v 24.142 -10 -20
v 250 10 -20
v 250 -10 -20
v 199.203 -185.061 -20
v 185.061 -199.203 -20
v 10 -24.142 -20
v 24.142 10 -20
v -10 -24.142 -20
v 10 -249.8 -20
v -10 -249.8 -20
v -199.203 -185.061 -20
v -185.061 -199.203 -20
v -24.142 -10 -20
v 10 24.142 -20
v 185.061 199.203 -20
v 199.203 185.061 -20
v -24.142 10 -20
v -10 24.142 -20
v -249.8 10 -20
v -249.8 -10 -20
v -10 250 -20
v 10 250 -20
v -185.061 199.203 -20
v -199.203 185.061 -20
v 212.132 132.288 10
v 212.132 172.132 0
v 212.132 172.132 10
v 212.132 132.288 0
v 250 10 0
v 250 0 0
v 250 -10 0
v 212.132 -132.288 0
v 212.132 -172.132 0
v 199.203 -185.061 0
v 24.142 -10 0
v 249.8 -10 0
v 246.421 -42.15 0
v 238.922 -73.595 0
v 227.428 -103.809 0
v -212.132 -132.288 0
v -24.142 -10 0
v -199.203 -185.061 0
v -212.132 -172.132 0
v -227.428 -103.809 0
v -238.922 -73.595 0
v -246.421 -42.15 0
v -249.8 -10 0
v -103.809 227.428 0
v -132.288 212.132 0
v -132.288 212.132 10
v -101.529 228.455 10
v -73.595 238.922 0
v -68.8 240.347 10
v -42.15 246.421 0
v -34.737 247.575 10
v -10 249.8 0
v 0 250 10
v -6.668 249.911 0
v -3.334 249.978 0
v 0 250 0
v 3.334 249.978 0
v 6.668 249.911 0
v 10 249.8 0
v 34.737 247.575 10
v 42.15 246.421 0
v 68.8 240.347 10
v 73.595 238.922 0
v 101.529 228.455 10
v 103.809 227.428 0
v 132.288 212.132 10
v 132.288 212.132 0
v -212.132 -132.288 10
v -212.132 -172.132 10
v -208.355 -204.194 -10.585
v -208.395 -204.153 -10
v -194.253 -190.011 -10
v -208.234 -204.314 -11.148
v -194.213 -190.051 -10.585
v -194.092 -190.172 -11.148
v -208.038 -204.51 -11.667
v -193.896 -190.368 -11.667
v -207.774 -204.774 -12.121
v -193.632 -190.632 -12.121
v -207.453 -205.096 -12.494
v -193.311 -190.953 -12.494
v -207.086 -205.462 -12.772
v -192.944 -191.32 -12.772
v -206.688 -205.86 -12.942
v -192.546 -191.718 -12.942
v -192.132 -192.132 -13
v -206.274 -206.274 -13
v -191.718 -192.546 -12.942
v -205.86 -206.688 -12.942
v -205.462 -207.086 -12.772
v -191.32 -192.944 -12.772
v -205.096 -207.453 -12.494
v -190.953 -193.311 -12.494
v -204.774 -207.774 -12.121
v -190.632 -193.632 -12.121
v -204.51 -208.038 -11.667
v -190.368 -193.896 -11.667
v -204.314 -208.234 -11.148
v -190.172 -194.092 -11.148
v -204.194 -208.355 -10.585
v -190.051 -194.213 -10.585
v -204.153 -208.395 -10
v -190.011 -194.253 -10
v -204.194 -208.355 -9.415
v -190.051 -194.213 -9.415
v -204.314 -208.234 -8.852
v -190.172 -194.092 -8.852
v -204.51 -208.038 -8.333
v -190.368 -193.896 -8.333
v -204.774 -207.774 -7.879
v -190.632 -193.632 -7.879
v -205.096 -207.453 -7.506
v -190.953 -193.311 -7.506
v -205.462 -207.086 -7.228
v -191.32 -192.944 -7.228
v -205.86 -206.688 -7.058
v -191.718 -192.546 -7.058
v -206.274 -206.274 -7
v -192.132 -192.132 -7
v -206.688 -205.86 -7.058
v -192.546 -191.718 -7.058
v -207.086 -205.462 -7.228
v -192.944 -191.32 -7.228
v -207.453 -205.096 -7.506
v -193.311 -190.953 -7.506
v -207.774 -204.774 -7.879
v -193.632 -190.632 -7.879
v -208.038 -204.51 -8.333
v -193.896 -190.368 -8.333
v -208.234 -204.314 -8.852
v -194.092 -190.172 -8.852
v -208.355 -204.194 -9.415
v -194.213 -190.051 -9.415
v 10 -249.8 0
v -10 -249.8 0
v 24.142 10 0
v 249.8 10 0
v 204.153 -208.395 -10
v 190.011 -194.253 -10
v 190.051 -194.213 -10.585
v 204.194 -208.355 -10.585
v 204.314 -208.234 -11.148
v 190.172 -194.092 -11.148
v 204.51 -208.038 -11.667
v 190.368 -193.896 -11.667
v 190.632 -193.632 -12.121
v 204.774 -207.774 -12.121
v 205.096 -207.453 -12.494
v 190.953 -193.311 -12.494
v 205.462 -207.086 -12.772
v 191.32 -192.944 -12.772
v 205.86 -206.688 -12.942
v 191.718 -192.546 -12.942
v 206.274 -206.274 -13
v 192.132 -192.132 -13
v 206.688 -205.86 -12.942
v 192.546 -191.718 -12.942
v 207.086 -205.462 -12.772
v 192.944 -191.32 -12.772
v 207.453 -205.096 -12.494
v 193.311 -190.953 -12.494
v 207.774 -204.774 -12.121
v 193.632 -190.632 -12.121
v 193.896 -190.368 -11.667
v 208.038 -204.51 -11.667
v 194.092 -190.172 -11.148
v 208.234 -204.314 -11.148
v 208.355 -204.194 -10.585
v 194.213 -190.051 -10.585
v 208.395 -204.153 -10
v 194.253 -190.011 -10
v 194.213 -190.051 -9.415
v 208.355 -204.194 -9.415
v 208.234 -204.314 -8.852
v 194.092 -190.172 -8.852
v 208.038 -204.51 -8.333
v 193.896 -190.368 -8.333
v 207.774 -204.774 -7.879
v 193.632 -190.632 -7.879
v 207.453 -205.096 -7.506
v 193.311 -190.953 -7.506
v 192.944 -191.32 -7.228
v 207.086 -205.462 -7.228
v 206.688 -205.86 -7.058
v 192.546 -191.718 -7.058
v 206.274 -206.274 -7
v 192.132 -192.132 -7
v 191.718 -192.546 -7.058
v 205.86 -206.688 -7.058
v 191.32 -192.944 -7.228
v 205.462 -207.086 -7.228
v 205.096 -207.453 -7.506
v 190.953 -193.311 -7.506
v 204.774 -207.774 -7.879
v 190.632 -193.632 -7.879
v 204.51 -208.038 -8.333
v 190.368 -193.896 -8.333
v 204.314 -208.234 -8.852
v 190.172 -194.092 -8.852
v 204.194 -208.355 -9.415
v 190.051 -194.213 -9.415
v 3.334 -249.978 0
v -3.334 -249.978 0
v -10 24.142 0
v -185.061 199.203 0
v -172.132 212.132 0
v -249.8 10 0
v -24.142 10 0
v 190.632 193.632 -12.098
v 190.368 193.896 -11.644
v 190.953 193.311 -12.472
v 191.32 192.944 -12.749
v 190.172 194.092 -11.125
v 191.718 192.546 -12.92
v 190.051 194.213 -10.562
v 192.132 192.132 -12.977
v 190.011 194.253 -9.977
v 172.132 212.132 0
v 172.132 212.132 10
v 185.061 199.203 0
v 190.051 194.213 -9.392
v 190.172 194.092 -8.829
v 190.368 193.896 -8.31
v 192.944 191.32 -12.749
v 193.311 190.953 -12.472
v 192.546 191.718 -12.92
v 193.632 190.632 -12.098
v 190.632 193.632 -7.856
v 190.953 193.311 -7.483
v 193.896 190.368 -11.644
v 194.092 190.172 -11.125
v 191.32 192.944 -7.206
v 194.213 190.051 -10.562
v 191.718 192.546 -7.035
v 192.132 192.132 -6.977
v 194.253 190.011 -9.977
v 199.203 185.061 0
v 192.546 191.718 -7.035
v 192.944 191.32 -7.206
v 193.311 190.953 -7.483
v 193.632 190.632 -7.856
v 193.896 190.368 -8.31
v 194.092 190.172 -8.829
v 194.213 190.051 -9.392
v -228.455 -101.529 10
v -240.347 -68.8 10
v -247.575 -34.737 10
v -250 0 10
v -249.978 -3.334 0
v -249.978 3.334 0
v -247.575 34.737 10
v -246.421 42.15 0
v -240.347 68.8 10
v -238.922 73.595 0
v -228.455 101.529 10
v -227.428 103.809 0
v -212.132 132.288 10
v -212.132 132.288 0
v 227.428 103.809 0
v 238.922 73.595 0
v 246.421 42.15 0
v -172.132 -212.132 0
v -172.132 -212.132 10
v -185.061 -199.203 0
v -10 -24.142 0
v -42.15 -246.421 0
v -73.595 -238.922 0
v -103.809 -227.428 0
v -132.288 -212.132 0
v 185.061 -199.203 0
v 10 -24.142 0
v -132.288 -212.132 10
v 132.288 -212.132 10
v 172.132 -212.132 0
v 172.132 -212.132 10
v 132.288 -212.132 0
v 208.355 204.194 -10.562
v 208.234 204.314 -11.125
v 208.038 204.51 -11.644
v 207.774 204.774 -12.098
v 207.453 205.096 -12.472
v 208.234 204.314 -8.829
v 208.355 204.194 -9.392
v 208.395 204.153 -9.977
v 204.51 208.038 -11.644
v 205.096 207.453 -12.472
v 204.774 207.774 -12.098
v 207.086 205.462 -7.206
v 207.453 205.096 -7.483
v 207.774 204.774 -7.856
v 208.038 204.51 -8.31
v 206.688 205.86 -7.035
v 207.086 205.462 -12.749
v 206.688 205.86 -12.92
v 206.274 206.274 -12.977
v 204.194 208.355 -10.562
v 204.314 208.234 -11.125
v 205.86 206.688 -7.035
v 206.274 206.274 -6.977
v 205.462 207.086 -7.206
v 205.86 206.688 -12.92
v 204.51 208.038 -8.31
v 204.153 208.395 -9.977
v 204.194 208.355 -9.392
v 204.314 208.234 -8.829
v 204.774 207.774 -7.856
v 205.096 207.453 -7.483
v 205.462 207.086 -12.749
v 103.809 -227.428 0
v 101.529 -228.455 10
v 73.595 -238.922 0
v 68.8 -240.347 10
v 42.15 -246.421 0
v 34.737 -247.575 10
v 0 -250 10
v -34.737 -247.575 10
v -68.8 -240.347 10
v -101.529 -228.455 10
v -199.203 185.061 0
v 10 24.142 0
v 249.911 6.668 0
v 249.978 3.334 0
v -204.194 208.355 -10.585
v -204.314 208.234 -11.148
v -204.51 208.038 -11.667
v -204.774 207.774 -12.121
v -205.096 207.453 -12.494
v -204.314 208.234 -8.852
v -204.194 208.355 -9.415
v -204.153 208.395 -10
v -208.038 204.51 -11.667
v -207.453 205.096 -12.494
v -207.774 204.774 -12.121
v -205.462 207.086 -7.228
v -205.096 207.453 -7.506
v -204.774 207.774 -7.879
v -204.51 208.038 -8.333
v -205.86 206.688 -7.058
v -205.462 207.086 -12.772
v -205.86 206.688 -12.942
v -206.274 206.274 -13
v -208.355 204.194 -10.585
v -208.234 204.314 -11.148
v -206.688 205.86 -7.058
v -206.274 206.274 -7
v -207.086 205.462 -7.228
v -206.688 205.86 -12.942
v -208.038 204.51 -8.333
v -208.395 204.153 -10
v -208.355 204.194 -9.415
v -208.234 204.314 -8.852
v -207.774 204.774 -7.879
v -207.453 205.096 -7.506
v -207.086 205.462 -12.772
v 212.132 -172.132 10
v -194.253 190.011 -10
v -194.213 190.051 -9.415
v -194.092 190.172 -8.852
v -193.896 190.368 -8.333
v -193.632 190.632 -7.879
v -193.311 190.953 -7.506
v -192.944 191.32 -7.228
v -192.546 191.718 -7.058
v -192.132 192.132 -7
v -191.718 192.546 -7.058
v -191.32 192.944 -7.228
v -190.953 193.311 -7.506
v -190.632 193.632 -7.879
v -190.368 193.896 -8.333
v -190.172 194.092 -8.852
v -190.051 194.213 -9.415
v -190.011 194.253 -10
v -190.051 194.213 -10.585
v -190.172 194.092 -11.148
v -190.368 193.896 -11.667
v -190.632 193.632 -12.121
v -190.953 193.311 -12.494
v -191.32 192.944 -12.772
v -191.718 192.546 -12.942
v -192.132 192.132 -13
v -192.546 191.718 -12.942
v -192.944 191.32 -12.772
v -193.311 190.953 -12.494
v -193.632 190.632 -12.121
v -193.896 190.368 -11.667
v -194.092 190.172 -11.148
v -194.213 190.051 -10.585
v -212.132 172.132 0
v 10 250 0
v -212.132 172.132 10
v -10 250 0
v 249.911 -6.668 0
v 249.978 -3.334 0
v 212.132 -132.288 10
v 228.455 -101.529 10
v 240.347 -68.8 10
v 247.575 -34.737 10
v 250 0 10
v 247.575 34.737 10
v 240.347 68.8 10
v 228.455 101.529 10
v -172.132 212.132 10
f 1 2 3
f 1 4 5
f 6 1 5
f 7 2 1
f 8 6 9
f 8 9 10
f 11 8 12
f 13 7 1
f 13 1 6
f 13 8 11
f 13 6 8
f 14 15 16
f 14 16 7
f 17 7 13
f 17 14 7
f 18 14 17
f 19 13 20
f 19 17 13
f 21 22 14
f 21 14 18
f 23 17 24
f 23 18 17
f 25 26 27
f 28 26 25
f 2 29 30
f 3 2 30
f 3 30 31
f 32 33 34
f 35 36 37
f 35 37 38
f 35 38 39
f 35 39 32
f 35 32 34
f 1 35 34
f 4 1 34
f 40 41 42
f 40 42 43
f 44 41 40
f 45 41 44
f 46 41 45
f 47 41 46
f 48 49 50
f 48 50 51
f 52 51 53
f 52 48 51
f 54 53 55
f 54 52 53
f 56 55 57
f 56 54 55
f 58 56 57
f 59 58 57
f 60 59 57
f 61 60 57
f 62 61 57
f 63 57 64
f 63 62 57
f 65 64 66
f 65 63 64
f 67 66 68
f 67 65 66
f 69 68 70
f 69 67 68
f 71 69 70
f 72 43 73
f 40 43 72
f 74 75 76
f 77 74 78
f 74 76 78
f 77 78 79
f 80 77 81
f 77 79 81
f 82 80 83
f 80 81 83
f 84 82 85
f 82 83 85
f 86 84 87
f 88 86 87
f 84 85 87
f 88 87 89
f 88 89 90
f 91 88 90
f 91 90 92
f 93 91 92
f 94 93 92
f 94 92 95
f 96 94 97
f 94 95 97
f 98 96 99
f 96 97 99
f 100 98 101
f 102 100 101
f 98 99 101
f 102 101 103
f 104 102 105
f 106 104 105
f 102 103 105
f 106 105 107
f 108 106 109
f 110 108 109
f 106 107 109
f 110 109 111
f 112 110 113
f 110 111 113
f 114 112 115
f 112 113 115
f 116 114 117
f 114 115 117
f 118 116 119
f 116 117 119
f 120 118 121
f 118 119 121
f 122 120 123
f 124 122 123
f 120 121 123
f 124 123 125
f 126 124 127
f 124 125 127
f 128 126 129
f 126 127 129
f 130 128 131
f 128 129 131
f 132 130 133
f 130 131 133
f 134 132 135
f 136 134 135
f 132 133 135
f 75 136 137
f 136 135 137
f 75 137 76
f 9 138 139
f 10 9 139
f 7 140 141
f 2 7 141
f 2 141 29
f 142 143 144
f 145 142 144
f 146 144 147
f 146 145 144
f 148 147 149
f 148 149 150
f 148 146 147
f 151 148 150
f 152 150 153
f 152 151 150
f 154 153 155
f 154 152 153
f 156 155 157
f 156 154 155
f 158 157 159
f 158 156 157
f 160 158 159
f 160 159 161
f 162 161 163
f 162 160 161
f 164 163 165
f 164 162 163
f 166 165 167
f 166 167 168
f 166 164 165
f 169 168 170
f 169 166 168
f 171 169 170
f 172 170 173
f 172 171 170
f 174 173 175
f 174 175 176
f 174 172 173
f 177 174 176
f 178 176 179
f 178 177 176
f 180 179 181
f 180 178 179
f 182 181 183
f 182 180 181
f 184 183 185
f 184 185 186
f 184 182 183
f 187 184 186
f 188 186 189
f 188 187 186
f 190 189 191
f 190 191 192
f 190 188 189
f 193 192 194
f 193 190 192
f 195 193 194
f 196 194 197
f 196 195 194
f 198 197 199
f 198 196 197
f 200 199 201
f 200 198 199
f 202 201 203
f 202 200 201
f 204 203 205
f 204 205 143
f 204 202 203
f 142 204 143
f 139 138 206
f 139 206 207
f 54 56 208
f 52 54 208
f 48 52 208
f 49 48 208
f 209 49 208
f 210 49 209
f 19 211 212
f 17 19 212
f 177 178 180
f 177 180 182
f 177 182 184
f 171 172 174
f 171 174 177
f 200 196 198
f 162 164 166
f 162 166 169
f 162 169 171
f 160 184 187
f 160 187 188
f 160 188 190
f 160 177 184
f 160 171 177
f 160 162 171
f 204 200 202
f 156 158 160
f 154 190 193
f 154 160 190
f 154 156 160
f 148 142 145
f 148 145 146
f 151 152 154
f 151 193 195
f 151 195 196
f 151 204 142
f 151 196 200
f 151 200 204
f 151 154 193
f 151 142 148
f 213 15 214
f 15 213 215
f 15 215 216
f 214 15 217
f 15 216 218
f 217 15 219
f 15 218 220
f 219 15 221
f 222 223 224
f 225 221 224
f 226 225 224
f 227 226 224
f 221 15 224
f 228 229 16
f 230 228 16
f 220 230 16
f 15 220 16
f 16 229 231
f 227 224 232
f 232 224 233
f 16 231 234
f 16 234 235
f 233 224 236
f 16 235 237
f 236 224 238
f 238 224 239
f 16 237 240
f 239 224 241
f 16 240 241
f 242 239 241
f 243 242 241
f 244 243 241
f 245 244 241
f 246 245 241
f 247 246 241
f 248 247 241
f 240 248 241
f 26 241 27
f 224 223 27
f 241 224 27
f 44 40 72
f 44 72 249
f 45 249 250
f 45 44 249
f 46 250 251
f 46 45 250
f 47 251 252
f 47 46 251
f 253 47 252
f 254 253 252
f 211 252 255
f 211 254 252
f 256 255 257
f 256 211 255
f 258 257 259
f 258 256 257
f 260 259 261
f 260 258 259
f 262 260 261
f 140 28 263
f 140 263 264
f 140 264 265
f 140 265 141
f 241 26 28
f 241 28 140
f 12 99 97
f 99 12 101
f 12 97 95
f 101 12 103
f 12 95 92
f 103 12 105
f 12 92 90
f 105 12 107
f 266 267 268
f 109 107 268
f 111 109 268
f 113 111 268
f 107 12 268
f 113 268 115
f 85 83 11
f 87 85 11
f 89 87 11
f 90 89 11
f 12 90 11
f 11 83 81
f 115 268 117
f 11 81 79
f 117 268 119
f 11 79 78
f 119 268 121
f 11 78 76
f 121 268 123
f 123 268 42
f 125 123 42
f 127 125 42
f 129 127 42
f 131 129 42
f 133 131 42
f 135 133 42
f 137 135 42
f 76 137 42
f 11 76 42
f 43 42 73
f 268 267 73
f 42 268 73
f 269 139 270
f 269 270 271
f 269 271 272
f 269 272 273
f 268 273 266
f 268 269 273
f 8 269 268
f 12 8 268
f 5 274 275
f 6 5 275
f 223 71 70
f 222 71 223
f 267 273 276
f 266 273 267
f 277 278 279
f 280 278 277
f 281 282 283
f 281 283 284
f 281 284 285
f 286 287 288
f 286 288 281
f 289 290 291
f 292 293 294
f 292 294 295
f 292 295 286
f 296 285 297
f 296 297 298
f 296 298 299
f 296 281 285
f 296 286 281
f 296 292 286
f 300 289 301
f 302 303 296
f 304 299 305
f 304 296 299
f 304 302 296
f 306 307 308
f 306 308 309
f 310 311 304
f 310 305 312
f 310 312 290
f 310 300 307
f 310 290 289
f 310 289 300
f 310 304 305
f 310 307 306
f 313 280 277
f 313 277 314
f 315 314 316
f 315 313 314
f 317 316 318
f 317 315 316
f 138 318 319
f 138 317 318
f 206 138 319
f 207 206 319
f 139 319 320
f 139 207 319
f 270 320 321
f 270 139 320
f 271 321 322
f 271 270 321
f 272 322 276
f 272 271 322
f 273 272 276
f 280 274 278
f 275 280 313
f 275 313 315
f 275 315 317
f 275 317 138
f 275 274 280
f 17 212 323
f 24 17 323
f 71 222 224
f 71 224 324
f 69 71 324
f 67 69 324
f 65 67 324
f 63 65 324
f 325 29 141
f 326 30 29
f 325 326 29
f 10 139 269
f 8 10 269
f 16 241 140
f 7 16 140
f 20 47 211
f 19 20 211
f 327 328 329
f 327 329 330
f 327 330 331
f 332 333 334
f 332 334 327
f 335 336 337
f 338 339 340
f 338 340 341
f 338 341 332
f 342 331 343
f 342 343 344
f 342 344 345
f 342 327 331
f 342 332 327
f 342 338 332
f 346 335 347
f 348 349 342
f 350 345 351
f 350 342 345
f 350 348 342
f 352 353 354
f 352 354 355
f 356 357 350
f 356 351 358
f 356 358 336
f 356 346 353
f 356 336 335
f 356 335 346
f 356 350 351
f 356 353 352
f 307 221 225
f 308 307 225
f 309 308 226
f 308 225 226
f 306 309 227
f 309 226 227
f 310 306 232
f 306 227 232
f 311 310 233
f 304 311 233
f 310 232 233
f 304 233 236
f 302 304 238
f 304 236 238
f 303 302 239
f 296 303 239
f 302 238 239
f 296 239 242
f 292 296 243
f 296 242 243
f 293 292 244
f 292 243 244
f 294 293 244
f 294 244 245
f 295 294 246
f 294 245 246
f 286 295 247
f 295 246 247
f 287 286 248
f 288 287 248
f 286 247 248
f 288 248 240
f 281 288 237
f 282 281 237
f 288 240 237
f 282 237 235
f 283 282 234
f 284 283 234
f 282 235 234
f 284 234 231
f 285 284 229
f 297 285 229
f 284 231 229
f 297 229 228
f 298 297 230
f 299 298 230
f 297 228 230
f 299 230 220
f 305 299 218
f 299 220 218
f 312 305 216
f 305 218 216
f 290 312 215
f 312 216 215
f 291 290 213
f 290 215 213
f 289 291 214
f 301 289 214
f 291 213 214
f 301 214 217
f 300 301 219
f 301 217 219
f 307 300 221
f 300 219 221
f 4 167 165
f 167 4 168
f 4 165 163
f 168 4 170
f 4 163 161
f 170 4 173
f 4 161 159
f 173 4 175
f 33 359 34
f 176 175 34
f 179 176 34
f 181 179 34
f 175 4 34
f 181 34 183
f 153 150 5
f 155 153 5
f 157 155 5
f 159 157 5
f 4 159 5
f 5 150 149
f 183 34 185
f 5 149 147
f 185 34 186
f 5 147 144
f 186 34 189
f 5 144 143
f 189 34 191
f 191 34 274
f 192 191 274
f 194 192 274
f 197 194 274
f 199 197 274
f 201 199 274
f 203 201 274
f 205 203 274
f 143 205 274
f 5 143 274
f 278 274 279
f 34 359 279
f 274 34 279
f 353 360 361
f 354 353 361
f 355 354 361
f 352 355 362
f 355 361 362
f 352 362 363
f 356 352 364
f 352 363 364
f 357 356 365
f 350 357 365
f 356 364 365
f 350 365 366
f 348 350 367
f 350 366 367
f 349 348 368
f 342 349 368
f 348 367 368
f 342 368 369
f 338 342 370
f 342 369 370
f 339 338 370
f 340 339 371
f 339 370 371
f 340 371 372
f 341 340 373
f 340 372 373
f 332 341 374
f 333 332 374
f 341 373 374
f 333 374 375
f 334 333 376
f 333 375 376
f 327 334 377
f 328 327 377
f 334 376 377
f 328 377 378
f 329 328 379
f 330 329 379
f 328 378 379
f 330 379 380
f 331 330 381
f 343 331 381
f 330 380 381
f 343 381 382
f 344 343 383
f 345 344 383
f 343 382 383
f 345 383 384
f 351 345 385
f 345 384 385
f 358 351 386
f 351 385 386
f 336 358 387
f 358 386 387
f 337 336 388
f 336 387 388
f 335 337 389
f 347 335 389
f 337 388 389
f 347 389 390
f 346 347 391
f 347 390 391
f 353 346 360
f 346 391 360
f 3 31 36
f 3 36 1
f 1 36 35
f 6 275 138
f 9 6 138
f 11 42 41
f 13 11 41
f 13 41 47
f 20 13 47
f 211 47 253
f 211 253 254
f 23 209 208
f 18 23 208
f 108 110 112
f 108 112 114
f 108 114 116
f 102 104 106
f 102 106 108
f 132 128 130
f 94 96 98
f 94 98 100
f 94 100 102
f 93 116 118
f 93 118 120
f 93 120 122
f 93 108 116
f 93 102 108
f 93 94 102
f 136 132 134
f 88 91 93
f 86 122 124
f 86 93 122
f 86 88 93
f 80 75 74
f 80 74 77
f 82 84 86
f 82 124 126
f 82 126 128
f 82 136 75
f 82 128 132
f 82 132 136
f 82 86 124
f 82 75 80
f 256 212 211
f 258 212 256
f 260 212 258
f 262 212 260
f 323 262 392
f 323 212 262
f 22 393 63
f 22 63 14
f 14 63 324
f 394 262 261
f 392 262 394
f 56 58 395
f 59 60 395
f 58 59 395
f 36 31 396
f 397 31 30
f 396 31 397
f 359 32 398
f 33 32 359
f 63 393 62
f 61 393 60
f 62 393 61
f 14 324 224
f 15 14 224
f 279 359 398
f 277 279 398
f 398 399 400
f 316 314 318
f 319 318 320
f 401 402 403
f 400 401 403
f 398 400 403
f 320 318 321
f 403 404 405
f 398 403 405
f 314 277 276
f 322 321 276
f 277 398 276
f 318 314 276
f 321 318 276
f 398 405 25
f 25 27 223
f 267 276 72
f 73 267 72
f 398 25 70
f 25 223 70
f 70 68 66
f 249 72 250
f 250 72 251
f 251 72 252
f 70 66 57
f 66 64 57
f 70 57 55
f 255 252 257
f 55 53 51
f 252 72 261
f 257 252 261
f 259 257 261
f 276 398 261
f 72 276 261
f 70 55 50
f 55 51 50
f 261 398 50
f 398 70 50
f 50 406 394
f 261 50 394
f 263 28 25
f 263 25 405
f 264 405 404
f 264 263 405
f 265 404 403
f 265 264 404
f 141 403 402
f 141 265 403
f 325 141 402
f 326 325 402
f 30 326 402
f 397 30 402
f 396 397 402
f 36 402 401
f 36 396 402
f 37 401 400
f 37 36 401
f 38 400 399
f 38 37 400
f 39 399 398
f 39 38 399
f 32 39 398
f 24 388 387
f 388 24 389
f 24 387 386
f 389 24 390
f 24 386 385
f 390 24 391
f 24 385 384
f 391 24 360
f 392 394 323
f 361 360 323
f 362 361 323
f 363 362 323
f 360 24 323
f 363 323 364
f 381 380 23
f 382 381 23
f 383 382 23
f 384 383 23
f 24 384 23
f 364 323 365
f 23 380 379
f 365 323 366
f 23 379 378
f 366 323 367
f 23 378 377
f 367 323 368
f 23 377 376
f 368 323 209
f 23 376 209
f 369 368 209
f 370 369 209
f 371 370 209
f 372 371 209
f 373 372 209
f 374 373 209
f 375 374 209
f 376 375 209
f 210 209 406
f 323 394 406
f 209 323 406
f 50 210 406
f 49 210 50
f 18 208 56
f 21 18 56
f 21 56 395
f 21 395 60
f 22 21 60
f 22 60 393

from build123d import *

# Parameters (mm, degrees)
BOSS_EXTRUDE2_DEPTH = 10
BOSS_EXTRUDE3_DEPTH = 20
SKETCH3_R           = 3
BOSS_EXTRUDE4_DEPTH = 20
SKETCH4_R           = 3
BOSS_EXTRUDE5_DEPTH = 20
SKETCH5_R           = 3
BOSS_EXTRUDE6_DEPTH = 20
BOSS_EXTRUDE7_START = 20
SKETCH8_R           = 3
BOSS_EXTRUDE7_DEPTH = 20


with BuildPart() as part:
    # Sketch1 → Boss-Extrude2 (new body)
    with BuildSketch(Plane.XY):
        with BuildLine():
            Line((-172.132034356, 212.132034356), (-132.287565553, 212.132034356))
            ThreePointArc((-132.287565553, 212.132034356), (0, 250), (132.287565553, 212.132034356))
            Line((132.287565553, 212.132034356), (172.132034356, 212.132034356))
            Line((172.132034356, 212.132034356), (212.132034356, 172.132034356))
            Line((212.132034356, 172.132034356), (212.132034356, 132.287565553))
            ThreePointArc((212.132034356, 132.287565553), (250, 0), (212.132034356, -132.287565553))
            Line((212.132034356, -132.287565553), (212.132034356, -172.132034356))
            Line((212.132034356, -172.132034356), (172.132034356, -212.132034356))
            Line((172.132034356, -212.132034356), (132.287565553, -212.132034356))
            ThreePointArc((132.287565553, -212.132034356), (0, -250), (-132.287565553, -212.132034356))
            Line((-132.287565553, -212.132034356), (-172.132034356, -212.132034356))
            Line((-172.132034356, -212.132034356), (-212.132034356, -172.132034356))
            Line((-212.132034356, -172.132034356), (-212.132034356, -132.287565553))
            ThreePointArc((-212.132034356, -132.287565553), (-250, 0), (-212.132034356, 132.287565553))
            Line((-212.132034356, 132.287565553), (-212.132034356, 172.132034356))
            Line((-212.132034356, 172.132034356), (-172.132034356, 212.132034356))
        make_face()
    extrude(amount=BOSS_EXTRUDE2_DEPTH)

    # Sketch2 → Boss-Extrude3 (add)
    with BuildSketch(Plane(origin=(0, 0, 0), x_dir=(-1, 0, 0), z_dir=(0, 0, -1))):
        Polygon((10, 250), (-10, 250), (-10, 24.142135624), (-185.060966544, 199.203102168), (-199.203102168, 185.060966544), (-24.142135624, 10), (-250, 10), (-250, -10), (-24.142135624, -10), (-199.203102168, -185.060966544), (-185.060966544, -199.203102168), (-10, -24.142135624), (-10, -249.799919936), (10, -249.799919936), (10, -24.142135624), (185.060966544, -199.203102168), (199.203102168, -185.060966544), (24.142135624, -10), (249.799919936, -10), (249.799919936, 10), (24.142135624, 10), (199.203102168, 185.060966544), (192.132034356, 192.132034356), (185.060966544, 199.203102168), (10, 24.142135624), align=None)
    extrude(amount=BOSS_EXTRUDE3_DEPTH)

    # Sketch3 → Boss-Extrude4 (add)
    with BuildSketch(Plane(origin=(192.132034356, 192.132034356, 0), x_dir=(0, 0, -1), z_dir=(0.7071067811865465, 0.7071067811865487, 0))):
        with Locations(Location((9.977178016, 0, 0), (0, 0, 90))):
            Circle(SKETCH3_R)
    extrude(amount=BOSS_EXTRUDE4_DEPTH)

    # Sketch4 → Boss-Extrude5 (add)
    with BuildSketch(Plane(origin=(-192.132034356, 192.132034356, 0), x_dir=(0, 0, 1), z_dir=(-0.707106781186549, 0.707106781186546, 0))):
        with Locations(Location((-10, 0, 0), (0, 0, 270))):
            Circle(SKETCH4_R)
    extrude(amount=BOSS_EXTRUDE5_DEPTH)

    # Sketch5 → Boss-Extrude6 (add)
    with BuildSketch(Plane(origin=(-192.132034356, -192.132034356, 0), x_dir=(0, 0, 1), z_dir=(-0.7071067811865456, -0.7071067811865495, 0))):
        with Locations(Location((-10, 0, 0), (0, 0, 90))):
            Circle(SKETCH5_R)
    extrude(amount=BOSS_EXTRUDE6_DEPTH)

    # Sketch8 → Boss-Extrude7 (add)
    with BuildSketch(Plane(origin=(192.132034356, -192.132034356, 0), x_dir=(0, 0, -1), z_dir=(0.7071067811865489, -0.7071067811865462, 0)).offset(BOSS_EXTRUDE7_START)):
        with Locations(Location((10, 0, 0), (0, 0, 270))):
            Circle(SKETCH8_R)
    extrude(amount=-BOSS_EXTRUDE7_DEPTH)


solid = part.part
